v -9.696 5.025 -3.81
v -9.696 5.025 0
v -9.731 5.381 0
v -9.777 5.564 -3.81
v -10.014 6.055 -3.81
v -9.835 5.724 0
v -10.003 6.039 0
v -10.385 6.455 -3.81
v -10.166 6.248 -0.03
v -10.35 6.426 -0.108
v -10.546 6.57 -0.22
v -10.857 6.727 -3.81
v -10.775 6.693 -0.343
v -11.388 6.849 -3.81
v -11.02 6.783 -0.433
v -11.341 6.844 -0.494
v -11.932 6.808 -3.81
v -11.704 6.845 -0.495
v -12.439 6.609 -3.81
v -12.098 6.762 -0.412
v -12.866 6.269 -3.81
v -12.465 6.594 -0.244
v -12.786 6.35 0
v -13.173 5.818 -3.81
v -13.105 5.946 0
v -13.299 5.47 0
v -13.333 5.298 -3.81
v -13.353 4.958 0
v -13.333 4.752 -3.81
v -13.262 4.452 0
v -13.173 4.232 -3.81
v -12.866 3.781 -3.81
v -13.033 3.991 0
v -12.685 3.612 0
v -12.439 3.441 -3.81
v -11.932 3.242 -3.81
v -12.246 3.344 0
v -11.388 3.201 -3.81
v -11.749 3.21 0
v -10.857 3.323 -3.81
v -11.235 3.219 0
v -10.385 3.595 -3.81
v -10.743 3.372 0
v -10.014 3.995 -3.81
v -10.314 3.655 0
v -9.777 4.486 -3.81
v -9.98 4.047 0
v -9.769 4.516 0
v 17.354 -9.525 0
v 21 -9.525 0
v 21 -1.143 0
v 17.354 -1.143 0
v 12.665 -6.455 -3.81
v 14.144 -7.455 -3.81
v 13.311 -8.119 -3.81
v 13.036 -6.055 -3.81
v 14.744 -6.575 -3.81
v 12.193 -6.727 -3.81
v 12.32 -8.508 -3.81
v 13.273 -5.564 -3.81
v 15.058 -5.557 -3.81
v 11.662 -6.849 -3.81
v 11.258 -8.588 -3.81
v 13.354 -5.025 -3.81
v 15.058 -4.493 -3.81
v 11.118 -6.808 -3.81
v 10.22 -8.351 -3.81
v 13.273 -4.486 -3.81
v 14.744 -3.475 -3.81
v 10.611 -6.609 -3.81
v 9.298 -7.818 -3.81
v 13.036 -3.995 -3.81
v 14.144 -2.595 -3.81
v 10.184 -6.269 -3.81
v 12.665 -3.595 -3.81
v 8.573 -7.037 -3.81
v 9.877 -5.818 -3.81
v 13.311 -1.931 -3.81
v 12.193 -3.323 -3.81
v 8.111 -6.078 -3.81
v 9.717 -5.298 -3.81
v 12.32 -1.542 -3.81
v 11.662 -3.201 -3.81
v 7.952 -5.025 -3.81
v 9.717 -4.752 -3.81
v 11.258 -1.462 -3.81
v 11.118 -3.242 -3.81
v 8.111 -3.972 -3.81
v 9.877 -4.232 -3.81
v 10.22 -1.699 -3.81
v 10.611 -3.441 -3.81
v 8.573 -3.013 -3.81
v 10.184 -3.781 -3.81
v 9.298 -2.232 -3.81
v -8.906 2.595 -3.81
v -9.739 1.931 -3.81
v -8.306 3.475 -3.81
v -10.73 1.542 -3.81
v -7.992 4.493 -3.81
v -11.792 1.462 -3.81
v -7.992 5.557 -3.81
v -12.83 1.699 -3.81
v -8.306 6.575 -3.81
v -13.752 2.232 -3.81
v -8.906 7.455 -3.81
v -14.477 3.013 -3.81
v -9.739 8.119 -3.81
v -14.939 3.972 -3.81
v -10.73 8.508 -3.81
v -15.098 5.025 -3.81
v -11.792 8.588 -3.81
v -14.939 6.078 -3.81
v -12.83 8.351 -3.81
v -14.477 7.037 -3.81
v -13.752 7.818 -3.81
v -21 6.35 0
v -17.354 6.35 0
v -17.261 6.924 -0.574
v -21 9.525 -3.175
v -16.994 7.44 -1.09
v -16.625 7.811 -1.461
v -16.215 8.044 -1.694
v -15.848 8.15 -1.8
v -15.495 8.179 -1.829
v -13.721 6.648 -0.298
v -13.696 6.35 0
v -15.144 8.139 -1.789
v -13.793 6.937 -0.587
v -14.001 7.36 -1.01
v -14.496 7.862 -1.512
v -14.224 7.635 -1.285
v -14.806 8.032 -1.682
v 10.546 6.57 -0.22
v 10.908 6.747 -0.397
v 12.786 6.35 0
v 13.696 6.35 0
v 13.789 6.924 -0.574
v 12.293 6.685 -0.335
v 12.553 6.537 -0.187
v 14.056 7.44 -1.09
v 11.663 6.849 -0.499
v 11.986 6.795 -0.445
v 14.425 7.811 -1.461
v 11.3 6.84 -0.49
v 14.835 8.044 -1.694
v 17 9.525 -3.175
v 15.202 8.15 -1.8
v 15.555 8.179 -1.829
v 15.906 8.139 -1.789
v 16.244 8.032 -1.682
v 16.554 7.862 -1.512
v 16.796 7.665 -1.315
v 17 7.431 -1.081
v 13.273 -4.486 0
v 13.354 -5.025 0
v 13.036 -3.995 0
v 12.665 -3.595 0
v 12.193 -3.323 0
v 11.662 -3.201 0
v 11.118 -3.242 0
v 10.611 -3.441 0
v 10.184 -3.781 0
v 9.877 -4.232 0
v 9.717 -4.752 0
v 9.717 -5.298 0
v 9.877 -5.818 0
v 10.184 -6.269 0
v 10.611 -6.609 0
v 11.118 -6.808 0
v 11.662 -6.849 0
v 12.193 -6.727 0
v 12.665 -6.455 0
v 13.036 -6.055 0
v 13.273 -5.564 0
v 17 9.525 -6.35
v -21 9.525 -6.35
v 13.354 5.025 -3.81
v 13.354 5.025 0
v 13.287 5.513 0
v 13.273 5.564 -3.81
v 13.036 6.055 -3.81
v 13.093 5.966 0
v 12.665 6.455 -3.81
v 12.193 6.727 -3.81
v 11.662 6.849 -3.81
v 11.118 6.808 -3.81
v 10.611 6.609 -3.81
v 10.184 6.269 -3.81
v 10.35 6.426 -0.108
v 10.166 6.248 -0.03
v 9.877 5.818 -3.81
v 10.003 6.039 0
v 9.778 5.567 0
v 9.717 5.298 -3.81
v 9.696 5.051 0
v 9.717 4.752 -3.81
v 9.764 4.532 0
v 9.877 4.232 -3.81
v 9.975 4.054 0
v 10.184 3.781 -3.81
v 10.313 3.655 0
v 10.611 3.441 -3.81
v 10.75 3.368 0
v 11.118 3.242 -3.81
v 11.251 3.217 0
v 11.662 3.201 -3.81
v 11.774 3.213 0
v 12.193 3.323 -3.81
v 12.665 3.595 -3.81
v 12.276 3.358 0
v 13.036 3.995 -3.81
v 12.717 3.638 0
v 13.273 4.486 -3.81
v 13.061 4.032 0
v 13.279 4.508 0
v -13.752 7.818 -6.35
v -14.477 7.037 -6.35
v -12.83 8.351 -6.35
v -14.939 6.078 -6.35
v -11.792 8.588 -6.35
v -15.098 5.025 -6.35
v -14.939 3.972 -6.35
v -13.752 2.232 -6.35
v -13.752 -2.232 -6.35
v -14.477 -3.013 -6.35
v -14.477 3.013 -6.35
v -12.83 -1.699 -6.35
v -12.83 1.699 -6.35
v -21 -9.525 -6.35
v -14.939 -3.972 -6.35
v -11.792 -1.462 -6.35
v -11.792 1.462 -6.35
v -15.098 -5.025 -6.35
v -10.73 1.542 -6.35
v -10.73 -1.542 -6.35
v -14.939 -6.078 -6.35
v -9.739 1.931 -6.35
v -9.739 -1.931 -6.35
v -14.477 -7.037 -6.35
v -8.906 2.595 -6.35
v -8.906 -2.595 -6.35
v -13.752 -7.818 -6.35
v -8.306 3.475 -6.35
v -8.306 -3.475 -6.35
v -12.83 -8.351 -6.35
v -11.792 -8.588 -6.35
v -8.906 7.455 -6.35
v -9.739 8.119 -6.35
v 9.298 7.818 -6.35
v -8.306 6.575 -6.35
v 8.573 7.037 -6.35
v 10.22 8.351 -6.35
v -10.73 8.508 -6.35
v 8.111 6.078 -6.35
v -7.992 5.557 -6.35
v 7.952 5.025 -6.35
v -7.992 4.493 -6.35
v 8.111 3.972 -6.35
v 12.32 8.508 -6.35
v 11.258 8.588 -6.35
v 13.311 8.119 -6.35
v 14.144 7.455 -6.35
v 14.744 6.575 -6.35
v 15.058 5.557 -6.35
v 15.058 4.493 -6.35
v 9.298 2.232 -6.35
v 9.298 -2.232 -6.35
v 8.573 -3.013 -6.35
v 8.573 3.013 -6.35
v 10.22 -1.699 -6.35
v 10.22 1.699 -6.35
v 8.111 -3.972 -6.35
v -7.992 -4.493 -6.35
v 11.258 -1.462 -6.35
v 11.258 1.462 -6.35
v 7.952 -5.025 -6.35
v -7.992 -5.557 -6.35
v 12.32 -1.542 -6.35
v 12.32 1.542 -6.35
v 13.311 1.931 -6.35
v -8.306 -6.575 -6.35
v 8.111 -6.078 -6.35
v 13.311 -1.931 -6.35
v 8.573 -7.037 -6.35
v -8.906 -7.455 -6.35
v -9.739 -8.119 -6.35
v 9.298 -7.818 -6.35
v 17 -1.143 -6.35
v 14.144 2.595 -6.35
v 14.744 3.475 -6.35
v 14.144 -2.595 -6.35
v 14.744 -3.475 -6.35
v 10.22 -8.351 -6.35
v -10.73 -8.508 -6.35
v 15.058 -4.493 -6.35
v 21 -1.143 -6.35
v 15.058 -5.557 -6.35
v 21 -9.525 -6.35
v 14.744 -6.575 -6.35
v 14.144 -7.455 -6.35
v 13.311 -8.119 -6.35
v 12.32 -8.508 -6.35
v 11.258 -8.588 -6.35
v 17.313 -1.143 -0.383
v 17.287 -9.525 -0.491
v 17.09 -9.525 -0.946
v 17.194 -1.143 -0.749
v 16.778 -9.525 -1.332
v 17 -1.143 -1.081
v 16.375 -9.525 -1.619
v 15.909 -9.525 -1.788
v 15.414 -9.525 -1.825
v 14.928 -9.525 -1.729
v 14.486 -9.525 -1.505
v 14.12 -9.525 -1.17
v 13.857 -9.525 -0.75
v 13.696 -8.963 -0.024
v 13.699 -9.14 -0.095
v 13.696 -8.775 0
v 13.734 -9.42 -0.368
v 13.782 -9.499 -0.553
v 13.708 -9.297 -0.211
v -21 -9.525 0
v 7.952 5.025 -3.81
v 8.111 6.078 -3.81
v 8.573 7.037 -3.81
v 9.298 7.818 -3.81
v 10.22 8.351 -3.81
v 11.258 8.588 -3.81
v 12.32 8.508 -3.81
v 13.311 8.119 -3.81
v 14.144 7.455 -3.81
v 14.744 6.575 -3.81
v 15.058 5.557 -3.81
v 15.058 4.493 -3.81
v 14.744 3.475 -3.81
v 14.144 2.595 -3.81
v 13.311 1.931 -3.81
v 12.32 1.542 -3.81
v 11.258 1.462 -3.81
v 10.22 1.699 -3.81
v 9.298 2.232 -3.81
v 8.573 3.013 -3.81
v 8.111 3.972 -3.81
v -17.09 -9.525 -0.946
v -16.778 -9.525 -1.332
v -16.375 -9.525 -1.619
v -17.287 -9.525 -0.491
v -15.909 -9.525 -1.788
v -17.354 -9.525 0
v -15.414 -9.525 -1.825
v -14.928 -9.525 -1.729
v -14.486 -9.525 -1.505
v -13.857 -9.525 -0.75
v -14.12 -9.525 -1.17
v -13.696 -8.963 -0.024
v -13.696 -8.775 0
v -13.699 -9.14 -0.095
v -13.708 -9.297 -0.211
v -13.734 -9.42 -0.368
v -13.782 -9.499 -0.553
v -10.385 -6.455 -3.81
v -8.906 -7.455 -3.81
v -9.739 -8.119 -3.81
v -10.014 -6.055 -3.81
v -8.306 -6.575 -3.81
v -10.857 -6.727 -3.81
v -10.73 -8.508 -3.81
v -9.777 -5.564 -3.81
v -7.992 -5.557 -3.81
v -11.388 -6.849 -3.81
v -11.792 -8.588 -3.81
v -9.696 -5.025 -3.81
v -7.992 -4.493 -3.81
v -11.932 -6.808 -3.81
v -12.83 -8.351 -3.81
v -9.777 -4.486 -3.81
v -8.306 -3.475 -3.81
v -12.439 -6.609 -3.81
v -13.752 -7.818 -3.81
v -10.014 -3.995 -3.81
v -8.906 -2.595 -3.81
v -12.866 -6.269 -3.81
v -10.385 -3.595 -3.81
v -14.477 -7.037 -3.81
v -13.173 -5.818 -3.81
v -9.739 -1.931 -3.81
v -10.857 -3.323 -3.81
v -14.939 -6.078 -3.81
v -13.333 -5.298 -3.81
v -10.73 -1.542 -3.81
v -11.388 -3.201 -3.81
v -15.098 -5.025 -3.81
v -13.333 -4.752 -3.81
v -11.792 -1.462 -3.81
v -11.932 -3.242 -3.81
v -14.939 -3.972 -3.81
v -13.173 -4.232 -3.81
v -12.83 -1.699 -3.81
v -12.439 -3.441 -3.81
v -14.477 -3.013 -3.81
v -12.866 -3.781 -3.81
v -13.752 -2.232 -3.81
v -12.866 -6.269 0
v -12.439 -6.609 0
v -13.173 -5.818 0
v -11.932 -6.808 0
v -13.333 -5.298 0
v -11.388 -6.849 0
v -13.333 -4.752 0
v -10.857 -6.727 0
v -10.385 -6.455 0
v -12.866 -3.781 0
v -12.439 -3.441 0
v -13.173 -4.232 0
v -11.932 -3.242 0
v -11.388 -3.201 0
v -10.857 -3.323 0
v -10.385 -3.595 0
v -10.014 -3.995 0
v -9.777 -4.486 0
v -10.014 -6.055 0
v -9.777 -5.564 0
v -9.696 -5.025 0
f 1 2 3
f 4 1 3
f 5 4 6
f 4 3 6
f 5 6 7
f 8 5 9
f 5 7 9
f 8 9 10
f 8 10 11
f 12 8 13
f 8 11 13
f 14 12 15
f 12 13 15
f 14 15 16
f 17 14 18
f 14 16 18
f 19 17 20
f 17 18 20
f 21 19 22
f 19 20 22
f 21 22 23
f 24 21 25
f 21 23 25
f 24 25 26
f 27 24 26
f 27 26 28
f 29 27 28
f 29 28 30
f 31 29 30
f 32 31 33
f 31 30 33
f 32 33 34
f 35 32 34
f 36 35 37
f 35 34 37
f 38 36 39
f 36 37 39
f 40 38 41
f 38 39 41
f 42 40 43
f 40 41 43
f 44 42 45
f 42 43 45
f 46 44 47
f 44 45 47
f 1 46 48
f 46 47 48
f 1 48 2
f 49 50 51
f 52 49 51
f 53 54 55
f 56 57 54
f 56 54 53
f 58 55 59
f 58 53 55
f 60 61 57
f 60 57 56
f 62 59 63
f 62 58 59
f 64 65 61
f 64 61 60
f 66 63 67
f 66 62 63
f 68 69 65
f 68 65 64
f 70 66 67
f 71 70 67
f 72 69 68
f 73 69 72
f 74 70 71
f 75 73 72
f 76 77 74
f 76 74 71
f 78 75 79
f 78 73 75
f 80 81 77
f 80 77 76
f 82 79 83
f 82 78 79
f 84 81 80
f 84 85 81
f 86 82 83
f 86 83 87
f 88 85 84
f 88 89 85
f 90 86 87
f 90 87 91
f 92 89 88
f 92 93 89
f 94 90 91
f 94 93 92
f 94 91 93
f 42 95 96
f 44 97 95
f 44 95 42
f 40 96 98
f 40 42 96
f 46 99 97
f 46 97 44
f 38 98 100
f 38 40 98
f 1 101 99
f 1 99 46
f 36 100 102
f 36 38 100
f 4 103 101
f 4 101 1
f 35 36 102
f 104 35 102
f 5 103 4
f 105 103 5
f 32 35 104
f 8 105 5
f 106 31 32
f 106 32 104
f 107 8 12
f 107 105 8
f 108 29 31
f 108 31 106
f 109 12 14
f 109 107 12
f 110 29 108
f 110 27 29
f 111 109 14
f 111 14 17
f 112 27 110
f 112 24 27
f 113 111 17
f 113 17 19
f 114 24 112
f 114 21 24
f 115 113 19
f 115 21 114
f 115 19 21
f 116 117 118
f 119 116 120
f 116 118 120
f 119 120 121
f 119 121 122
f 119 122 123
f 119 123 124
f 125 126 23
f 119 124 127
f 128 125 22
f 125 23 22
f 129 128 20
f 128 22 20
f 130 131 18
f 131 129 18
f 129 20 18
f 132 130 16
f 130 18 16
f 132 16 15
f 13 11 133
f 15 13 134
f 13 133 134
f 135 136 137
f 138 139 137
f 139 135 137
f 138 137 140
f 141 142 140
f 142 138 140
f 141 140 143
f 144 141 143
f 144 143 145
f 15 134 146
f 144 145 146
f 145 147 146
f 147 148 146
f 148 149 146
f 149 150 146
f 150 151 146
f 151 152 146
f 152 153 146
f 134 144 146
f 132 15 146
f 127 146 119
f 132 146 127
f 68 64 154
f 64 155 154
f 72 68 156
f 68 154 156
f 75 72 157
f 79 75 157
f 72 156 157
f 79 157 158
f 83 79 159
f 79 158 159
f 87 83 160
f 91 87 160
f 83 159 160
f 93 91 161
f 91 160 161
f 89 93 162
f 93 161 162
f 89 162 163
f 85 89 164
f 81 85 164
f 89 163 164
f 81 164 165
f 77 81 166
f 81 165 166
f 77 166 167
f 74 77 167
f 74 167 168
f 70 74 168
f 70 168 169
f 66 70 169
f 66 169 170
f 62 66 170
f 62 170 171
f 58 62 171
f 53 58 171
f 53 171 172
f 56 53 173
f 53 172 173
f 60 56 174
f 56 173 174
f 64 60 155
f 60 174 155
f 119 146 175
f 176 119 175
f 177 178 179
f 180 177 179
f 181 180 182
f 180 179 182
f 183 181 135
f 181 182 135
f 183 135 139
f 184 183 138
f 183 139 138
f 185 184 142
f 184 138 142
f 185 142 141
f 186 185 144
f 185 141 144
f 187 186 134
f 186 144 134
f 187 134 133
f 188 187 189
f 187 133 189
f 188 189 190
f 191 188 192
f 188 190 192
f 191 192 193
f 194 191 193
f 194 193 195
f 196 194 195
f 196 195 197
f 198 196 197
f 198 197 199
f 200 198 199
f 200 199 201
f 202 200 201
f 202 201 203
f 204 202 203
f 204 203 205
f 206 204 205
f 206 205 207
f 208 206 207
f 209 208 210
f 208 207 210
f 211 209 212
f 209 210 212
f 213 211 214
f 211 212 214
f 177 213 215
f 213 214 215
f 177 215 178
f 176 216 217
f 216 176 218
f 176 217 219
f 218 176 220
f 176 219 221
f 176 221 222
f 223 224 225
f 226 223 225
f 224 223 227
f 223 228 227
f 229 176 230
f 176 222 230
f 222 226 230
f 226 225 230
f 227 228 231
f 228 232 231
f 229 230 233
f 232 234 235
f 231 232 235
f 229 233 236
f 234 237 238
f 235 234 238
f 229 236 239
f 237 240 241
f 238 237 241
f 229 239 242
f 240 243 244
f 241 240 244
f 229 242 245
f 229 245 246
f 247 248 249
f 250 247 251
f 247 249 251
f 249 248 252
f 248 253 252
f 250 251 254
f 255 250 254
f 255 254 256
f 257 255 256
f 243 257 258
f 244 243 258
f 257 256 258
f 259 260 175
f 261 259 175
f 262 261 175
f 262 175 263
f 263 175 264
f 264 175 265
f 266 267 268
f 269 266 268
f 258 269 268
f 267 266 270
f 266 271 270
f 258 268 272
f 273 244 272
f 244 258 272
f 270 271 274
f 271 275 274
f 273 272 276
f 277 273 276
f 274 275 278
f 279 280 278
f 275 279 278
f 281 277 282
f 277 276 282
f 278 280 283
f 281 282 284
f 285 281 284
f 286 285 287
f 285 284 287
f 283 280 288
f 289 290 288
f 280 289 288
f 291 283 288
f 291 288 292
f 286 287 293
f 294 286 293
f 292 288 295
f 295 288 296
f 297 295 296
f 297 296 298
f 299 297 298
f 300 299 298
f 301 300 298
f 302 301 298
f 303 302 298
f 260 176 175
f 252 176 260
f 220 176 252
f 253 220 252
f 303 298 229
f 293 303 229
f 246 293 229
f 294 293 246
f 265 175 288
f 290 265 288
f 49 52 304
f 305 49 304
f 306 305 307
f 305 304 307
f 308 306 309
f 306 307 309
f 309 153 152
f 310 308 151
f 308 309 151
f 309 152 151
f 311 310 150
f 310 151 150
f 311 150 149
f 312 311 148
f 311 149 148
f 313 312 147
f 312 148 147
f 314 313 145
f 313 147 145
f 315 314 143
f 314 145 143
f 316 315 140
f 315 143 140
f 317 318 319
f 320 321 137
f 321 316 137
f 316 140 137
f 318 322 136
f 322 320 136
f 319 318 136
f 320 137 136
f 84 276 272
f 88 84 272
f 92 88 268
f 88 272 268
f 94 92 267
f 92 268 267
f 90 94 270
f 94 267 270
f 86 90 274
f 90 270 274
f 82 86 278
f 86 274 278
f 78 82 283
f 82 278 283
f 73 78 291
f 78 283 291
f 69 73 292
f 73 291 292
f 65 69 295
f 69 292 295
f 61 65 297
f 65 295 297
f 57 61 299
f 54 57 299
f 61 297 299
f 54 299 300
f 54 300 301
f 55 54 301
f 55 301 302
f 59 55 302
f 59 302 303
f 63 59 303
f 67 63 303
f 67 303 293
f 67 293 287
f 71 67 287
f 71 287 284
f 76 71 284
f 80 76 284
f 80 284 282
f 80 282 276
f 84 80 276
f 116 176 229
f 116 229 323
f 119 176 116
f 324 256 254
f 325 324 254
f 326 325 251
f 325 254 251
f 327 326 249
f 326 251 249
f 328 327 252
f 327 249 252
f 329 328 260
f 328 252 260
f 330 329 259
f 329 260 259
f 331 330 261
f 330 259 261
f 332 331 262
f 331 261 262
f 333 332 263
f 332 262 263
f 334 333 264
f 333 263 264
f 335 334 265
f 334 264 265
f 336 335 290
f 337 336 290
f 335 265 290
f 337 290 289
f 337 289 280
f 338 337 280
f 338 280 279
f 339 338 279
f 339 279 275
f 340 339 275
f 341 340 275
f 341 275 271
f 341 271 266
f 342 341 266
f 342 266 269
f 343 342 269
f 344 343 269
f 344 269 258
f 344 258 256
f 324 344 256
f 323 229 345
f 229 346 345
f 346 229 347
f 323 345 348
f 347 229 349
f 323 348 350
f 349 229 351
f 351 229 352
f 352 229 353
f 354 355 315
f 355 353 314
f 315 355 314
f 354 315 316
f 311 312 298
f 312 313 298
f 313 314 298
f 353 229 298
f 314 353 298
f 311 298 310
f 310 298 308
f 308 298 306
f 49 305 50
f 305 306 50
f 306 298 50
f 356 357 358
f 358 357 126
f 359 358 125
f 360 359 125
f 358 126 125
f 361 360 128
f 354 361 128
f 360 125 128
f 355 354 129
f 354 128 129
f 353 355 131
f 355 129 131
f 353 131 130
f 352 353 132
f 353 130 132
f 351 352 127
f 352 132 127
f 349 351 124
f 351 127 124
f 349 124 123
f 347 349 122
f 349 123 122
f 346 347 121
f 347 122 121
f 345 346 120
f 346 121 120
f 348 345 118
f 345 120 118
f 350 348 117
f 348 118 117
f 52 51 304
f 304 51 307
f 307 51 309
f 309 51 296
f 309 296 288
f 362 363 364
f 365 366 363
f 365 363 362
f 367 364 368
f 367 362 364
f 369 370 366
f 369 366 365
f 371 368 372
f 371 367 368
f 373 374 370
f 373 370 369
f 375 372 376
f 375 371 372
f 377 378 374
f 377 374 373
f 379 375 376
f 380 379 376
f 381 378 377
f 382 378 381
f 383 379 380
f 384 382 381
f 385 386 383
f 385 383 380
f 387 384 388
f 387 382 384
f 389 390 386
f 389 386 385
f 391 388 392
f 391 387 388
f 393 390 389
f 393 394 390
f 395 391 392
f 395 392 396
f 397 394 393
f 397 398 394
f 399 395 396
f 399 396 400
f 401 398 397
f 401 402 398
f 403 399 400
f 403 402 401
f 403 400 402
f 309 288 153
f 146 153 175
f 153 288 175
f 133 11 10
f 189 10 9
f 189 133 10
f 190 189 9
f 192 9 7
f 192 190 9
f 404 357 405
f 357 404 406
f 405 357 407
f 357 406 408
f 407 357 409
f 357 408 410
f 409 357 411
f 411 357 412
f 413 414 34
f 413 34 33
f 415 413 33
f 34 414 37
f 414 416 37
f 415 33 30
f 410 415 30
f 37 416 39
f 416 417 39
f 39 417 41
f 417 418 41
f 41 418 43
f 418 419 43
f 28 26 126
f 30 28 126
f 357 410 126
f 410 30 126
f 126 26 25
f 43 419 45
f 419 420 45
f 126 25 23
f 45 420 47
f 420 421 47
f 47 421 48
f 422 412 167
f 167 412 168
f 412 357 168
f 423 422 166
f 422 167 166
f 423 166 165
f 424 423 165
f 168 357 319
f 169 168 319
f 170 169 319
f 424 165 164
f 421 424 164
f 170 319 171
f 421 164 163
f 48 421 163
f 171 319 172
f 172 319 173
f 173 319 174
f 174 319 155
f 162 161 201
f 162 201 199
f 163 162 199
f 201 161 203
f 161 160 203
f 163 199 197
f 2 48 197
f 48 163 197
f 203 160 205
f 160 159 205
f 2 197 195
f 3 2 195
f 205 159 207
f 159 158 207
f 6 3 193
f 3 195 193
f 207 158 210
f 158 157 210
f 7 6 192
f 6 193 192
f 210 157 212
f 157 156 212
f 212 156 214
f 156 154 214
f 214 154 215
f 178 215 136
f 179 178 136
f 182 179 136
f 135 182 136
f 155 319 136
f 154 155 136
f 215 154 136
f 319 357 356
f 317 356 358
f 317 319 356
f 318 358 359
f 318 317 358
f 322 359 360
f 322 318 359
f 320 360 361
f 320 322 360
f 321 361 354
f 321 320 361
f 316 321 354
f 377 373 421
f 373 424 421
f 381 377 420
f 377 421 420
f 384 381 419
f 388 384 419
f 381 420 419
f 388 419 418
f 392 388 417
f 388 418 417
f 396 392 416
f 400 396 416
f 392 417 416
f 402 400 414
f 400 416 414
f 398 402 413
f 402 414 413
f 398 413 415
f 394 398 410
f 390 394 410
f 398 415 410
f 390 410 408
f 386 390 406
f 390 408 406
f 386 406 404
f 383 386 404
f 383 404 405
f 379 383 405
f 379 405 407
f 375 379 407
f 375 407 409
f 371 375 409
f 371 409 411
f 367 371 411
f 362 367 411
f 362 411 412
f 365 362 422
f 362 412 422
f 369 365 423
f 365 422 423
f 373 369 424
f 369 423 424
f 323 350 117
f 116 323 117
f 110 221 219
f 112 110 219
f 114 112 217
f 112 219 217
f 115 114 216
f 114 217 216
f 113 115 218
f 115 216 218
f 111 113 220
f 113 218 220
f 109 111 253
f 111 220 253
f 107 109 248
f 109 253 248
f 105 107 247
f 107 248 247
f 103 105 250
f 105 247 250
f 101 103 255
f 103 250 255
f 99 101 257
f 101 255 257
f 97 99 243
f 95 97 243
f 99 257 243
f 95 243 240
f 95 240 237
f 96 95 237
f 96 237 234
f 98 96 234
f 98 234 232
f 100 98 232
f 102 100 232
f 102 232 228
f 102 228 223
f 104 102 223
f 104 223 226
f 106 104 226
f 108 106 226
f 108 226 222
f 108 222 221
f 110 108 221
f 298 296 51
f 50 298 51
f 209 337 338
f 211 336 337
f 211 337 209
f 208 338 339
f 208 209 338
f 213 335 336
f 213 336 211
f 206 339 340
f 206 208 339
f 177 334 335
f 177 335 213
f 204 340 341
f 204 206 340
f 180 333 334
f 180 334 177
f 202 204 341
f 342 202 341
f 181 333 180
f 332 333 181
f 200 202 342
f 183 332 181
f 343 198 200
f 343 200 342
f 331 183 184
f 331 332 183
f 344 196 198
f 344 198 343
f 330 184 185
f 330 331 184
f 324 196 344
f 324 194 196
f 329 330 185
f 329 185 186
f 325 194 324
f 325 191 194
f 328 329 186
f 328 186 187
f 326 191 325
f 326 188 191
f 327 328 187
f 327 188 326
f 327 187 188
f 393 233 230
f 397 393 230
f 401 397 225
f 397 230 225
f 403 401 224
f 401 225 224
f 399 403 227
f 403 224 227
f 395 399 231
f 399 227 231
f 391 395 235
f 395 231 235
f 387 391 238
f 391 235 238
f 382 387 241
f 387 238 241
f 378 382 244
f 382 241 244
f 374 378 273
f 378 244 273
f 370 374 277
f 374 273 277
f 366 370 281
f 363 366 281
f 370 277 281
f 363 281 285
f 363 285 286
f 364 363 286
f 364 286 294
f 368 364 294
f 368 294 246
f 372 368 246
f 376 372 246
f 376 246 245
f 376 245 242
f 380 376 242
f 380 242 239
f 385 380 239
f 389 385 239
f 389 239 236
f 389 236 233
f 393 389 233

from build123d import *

# Parameters (mm, degrees)
BOSS_EXTRUDE1_DEPTH                            = 21
CBORE_FOR_6_SOCKET_HEAD_CAP_SCREW1_D           = 3.6576
CBORE_FOR_6_SOCKET_HEAD_CAP_SCREW1_DEPTH       = 9.398
CBORE_FOR_6_SOCKET_HEAD_CAP_SCREW1_CBORE_D     = 7.14502
CBORE_FOR_6_SOCKET_HEAD_CAP_SCREW1_CBORE_DEPTH = 2.54
CBORE_FOR_6_SOCKET_HEAD_CAP_SCREW1_TIP         = 1.0988539
F_6_CLEARANCE_HOLE1_D                          = 3.6576
FILLET1_R                                      = 0.75
SKETCH8_W                                      = 4
SKETCH8_H                                      = 10.668
CUT_EXTRUDE1_DEPTH                             = 7.3500001


with BuildPart() as part:
    # Sketch1 → Boss-Extrude1 (new body, symmetric)
    with BuildSketch(Plane(origin=(0, 0, 0), x_dir=(0, 0, -1), z_dir=(1, 0, 0))):
        Polygon((0, 6.35), (3.175, 9.525), (6.35, 9.525), (6.35, -9.525), (0, -9.525), align=None)
    extrude(amount=BOSS_EXTRUDE1_DEPTH, both=True)

    # CBORE for #6 Socket Head Cap Screw1
    with Locations(Plane(origin=(0, 0, -6.35), x_dir=(-1, 0, 0), z_dir=(0, 0, -1))):
        with Locations((11.525, -5.025), (-11.525, 5.025), (-11.525, -5.025), (11.525, 5.025)):
            CounterBoreHole(CBORE_FOR_6_SOCKET_HEAD_CAP_SCREW1_D / 2, CBORE_FOR_6_SOCKET_HEAD_CAP_SCREW1_CBORE_D / 2, CBORE_FOR_6_SOCKET_HEAD_CAP_SCREW1_CBORE_DEPTH, depth=CBORE_FOR_6_SOCKET_HEAD_CAP_SCREW1_DEPTH)
            with Locations((0, 0, -(CBORE_FOR_6_SOCKET_HEAD_CAP_SCREW1_DEPTH + CBORE_FOR_6_SOCKET_HEAD_CAP_SCREW1_TIP / 2))):  # 118° drill point
                Cone(0, CBORE_FOR_6_SOCKET_HEAD_CAP_SCREW1_D / 2, CBORE_FOR_6_SOCKET_HEAD_CAP_SCREW1_TIP, mode=Mode.SUBTRACT)

    # #6 Clearance Hole1 (through all)
    with Locations(Plane(origin=(0, -9.525, 0), x_dir=(-1, 0, 0), z_dir=(0, -1, 0))):
        with Locations((-15.525, 0), (15.525, 0)):
            Hole(F_6_CLEARANCE_HOLE1_D / 2)

    # Fillet1
    fillet1_edges = [part.edges().sort_by_distance(p)[0] for p in [
        (0, 6.35, 0),
        (0, -9.525, 0),
    ]]
    fillet(fillet1_edges, radius=FILLET1_R)

    # Sketch8 → Cut-Extrude1 (cut, through all)
    with BuildSketch(Plane(origin=(0, 0, -6.35), x_dir=(-1, 0, 0), z_dir=(0, 0, -1))):
        with Locations((-19, 4.191)):
            Rectangle(SKETCH8_W, SKETCH8_H)
    extrude(amount=-CUT_EXTRUDE1_DEPTH, mode=Mode.SUBTRACT)


solid = part.part
